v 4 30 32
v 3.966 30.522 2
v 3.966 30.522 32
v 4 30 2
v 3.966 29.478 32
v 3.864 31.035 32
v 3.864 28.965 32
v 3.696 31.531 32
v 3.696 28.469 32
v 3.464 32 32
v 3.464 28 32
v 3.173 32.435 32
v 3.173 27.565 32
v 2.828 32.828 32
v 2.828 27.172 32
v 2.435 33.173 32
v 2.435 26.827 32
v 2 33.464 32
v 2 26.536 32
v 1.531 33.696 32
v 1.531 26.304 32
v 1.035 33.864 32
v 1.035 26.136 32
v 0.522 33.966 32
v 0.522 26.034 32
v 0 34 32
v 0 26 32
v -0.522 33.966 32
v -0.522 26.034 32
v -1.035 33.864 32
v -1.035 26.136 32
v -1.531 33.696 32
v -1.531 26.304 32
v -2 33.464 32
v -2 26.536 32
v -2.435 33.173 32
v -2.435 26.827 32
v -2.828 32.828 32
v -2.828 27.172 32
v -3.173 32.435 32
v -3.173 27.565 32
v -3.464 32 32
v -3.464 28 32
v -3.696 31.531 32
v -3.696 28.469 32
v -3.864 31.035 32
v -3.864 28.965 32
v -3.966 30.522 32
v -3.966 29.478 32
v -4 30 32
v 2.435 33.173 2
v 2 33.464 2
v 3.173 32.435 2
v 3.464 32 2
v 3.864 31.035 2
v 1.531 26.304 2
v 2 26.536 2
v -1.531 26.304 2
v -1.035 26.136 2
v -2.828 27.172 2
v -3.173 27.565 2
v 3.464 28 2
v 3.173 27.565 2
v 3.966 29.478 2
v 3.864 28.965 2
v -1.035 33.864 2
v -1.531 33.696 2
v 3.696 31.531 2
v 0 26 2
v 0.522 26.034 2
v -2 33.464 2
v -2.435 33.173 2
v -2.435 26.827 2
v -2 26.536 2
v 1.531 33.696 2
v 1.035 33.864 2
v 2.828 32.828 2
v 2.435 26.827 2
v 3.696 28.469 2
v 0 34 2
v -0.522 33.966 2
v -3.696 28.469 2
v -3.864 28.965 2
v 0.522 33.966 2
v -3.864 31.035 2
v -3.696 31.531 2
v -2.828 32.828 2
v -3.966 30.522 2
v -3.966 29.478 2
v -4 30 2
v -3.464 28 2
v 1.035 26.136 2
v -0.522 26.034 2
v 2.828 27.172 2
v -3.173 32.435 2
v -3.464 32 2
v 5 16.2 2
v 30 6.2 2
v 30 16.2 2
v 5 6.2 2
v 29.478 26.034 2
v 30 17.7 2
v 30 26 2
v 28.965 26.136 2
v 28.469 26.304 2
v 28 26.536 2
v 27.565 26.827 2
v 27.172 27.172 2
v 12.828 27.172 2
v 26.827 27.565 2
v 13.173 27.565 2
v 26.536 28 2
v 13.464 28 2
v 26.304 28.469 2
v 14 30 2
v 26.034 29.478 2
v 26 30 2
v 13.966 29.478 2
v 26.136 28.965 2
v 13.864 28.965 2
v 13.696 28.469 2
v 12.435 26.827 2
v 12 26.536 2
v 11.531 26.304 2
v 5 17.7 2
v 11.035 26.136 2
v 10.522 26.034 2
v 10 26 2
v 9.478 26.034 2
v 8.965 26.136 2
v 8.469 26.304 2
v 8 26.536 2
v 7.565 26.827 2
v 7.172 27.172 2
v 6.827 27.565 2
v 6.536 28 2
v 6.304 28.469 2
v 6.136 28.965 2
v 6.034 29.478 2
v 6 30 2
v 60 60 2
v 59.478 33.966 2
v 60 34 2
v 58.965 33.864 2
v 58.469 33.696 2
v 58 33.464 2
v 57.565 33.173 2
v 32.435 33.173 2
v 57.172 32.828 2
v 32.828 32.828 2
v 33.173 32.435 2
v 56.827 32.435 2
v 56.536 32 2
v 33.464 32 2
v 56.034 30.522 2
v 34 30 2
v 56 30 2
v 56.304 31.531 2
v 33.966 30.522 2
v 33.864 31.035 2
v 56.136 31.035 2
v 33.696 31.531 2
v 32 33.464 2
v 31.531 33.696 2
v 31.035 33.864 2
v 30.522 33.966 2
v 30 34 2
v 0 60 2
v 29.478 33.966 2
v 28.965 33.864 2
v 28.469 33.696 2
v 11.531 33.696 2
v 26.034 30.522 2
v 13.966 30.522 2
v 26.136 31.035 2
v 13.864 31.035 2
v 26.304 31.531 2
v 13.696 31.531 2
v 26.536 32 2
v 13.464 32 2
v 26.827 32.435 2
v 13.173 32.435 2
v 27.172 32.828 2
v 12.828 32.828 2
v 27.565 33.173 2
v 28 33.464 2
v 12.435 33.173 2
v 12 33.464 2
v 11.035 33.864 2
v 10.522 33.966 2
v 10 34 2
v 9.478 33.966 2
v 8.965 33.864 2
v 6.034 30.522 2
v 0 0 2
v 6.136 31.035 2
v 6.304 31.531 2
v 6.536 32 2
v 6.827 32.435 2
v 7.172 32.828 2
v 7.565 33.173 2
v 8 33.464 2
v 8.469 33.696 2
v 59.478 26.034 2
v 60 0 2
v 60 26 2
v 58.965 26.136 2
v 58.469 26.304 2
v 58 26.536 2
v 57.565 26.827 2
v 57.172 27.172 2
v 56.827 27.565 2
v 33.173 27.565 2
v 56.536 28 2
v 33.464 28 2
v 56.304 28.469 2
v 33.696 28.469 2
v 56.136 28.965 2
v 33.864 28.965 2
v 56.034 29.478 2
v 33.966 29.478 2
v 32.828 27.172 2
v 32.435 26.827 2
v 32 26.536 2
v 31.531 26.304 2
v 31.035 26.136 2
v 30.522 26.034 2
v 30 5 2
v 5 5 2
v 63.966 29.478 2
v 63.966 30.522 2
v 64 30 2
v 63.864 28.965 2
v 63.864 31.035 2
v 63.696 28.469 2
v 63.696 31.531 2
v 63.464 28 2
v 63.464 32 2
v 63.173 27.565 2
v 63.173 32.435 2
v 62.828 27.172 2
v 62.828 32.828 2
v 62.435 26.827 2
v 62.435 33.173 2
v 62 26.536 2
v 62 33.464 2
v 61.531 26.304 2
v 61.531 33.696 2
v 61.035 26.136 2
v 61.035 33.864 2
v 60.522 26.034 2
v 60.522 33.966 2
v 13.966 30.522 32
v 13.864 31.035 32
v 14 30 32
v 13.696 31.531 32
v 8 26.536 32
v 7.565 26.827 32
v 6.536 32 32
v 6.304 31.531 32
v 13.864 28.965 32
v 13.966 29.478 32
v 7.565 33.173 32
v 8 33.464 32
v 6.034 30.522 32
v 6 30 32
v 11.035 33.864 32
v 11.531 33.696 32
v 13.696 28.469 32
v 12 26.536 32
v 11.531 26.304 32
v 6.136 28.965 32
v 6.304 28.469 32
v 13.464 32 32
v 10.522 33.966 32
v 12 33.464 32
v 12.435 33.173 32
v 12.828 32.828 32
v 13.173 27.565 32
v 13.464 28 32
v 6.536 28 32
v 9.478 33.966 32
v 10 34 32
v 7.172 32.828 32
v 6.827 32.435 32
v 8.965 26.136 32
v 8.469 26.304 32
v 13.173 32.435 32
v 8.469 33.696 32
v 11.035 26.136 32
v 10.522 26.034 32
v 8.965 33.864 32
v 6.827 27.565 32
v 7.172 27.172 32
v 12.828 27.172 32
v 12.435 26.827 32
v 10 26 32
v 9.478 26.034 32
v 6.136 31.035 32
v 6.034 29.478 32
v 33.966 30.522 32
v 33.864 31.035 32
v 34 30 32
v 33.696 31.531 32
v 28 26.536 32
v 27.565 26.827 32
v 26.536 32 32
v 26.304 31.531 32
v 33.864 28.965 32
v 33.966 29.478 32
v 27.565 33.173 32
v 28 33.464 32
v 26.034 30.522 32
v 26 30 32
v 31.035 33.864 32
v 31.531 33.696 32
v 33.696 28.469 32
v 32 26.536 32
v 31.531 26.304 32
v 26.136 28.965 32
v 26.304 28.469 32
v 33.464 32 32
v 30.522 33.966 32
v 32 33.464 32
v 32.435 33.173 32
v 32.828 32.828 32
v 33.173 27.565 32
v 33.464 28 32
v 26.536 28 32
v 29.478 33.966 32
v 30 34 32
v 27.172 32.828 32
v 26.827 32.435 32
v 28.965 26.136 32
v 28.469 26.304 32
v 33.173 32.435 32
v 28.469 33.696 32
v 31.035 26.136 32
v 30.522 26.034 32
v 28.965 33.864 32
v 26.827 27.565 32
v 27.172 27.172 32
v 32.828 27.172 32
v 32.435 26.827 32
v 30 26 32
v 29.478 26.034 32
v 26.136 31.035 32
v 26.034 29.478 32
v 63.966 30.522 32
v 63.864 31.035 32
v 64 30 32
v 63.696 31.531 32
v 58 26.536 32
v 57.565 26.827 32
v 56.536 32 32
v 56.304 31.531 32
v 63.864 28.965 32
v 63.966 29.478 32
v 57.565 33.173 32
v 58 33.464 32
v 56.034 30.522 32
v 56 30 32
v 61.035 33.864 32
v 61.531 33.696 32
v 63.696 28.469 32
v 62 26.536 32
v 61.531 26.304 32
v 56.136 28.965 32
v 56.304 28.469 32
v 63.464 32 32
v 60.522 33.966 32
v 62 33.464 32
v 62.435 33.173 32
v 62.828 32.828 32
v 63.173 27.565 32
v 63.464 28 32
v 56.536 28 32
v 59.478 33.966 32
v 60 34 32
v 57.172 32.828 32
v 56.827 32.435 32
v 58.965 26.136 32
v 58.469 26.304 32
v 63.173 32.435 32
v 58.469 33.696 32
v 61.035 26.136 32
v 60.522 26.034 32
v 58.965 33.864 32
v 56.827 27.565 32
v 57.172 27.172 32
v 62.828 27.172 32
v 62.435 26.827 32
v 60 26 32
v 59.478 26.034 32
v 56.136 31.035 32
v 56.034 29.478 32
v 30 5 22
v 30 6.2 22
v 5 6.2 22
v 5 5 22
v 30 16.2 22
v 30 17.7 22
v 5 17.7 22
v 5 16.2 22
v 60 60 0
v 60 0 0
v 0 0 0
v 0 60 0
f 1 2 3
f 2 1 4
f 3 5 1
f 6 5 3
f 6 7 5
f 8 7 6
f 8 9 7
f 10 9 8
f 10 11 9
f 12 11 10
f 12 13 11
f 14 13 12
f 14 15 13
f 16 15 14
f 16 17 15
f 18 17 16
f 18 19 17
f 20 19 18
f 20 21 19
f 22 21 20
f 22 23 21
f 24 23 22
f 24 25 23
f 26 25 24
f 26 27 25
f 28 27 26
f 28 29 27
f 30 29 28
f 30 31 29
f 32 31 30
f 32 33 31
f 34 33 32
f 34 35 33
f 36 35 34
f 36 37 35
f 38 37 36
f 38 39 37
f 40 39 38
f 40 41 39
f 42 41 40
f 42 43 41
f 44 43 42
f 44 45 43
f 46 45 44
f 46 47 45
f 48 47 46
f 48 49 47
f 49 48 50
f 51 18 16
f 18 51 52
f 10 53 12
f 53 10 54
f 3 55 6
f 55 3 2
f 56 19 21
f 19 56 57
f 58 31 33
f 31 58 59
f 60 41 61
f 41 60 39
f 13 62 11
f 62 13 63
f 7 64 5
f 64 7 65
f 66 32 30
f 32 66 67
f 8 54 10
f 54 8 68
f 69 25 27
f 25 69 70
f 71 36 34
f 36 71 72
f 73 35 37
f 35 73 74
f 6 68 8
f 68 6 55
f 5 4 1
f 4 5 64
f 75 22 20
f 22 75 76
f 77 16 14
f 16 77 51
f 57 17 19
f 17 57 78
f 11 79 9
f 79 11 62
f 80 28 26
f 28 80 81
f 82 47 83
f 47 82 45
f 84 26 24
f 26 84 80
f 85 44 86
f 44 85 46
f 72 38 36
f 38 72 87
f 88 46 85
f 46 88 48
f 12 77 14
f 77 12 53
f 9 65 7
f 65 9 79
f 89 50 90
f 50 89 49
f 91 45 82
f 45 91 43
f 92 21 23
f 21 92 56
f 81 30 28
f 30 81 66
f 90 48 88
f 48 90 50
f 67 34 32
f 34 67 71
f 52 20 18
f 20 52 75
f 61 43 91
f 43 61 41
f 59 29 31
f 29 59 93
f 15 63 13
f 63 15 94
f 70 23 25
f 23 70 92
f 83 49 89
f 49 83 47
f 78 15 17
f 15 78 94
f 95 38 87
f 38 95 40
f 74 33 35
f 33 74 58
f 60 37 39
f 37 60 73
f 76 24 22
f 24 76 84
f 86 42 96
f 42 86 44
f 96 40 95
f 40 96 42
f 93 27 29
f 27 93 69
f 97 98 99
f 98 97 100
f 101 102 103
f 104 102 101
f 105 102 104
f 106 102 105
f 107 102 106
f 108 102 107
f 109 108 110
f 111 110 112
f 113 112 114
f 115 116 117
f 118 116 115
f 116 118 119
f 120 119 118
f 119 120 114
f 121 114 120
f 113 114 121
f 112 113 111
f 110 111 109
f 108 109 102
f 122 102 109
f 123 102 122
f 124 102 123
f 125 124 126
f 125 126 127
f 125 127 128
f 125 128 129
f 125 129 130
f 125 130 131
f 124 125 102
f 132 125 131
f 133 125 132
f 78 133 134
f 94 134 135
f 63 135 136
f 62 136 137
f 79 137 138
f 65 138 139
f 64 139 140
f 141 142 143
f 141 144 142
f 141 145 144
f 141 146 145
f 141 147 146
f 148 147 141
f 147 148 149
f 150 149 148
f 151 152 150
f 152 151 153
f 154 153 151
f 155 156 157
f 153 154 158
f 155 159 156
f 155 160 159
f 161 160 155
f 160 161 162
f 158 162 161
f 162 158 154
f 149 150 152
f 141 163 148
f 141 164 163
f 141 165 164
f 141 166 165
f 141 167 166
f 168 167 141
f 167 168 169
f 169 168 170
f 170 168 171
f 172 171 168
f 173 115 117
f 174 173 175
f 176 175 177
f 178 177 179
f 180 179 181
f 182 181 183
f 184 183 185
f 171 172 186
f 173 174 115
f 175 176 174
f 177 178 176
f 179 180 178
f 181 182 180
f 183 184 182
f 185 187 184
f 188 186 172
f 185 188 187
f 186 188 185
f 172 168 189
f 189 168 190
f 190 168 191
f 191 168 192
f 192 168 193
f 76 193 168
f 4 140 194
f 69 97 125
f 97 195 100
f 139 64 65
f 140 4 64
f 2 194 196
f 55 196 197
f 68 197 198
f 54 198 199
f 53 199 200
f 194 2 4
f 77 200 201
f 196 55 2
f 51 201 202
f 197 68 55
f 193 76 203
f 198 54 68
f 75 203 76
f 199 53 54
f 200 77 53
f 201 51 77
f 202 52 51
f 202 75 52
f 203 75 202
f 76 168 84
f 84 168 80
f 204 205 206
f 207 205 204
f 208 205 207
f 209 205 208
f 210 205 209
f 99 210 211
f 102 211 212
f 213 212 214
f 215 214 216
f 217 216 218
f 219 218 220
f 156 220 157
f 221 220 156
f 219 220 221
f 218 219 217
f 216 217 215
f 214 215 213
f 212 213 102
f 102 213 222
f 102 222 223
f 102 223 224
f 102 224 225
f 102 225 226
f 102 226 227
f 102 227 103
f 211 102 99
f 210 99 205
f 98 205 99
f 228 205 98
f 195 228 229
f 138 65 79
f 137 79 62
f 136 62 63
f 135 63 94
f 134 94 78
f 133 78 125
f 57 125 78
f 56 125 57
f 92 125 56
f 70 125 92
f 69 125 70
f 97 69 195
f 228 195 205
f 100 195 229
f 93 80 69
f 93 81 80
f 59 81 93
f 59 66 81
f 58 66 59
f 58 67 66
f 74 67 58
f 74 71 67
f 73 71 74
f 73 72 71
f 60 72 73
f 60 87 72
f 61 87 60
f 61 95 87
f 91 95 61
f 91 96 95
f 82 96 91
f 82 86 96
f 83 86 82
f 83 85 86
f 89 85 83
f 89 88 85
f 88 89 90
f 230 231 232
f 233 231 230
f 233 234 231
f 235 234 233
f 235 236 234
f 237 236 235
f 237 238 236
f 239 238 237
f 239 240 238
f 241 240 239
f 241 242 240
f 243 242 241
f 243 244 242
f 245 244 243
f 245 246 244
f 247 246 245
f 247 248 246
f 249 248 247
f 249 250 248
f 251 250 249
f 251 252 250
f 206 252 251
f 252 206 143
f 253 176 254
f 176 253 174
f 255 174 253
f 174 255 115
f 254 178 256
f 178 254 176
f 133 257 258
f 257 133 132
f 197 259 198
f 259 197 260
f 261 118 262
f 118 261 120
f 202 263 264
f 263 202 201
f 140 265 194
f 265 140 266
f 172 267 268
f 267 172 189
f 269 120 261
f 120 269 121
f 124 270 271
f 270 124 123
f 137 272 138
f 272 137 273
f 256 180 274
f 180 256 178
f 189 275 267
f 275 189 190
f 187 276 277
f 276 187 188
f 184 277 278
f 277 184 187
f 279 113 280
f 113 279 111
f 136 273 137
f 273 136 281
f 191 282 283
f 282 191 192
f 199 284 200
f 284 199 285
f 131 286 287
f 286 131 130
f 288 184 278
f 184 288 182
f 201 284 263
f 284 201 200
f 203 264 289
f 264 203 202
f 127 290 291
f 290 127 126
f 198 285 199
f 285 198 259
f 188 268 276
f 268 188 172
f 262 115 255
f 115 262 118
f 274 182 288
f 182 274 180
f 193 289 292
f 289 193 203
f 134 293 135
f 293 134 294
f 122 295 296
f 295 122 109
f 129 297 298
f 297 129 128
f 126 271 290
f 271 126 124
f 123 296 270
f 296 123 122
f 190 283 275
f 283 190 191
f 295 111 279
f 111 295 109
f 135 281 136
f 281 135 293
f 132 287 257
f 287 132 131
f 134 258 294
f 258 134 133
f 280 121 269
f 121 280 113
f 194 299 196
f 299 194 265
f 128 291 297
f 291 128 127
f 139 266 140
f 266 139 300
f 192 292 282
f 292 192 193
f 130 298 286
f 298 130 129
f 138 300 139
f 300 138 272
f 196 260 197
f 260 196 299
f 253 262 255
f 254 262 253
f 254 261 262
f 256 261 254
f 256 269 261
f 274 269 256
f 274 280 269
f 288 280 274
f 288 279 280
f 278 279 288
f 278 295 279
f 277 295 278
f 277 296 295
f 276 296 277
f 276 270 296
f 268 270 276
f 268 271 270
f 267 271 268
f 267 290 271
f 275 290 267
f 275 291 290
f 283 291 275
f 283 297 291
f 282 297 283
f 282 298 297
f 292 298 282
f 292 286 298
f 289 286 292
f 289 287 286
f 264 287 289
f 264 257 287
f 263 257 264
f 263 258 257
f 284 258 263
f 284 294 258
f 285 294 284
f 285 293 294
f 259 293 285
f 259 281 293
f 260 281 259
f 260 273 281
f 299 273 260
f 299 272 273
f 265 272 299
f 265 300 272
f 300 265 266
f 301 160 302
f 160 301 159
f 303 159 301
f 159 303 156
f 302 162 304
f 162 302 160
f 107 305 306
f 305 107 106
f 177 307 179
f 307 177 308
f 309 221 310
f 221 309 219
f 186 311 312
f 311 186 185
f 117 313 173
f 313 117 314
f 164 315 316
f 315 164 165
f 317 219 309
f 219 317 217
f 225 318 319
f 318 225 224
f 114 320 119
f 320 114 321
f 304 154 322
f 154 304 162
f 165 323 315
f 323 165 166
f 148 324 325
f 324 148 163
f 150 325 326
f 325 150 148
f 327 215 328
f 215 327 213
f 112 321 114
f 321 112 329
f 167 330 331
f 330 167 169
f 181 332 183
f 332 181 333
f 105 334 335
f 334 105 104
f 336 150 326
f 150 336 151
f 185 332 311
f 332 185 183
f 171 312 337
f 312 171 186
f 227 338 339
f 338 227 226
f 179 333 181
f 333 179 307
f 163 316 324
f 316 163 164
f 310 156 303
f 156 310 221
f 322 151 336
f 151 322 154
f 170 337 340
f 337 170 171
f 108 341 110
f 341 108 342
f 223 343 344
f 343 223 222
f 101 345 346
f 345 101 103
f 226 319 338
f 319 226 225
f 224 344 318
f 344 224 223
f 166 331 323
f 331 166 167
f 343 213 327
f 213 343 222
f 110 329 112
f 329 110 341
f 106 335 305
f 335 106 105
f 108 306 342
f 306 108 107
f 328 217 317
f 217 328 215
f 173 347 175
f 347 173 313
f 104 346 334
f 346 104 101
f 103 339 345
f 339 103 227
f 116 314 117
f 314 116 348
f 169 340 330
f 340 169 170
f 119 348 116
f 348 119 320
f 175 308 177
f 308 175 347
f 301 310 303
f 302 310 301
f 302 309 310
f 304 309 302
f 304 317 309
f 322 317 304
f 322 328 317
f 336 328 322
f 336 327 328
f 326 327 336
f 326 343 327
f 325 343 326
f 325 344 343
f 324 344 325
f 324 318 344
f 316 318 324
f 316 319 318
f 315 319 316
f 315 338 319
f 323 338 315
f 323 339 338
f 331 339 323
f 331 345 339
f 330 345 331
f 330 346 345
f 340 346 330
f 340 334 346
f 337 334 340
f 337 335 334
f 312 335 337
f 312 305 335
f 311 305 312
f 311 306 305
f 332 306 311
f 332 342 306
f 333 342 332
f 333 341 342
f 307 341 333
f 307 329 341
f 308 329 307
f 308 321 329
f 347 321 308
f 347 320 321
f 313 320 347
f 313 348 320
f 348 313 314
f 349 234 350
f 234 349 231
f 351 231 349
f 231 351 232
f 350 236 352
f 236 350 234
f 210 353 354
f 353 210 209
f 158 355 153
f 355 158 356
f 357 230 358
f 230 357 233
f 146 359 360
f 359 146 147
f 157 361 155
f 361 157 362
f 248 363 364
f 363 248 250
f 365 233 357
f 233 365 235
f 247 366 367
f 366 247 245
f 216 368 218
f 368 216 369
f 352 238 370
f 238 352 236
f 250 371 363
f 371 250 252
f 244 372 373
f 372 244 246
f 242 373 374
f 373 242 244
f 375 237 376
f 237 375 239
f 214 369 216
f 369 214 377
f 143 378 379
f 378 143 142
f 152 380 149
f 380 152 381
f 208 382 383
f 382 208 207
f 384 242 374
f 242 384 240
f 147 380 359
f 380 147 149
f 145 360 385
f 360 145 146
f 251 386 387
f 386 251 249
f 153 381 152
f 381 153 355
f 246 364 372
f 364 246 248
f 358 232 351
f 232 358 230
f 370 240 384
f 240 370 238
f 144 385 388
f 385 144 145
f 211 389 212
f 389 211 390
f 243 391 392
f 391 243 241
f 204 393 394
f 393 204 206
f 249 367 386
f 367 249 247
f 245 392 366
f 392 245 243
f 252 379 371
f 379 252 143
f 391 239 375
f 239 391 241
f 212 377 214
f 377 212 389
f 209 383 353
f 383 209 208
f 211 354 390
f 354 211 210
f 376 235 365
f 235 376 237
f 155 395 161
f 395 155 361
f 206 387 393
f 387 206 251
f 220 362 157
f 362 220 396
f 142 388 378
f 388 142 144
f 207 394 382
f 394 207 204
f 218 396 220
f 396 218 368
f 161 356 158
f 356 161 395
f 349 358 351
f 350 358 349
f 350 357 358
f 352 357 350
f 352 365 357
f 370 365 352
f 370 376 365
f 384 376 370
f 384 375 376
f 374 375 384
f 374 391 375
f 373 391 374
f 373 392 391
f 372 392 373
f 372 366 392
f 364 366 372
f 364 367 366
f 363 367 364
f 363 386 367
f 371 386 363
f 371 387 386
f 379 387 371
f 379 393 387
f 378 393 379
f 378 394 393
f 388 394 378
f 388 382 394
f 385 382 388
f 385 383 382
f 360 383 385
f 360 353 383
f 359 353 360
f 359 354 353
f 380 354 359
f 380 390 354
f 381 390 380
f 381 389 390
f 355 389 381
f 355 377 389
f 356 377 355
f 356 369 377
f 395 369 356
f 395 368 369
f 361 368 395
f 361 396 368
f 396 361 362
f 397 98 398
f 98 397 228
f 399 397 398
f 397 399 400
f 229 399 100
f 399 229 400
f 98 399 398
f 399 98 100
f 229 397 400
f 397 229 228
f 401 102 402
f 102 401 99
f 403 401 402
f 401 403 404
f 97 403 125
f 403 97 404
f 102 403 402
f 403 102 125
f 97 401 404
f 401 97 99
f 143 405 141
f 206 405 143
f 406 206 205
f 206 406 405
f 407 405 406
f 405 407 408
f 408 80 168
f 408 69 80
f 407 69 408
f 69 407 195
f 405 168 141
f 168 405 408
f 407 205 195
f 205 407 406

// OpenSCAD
// Calibration test print for Printalot Flex PLA
// Tests retraction (stringing) and thin wall integrity

// --- Parameters ---
base_thickness = 2;
base_width = 60;       // X dimension
base_depth = 60;       // Y dimension

// Retraction towers
tower_d = 8;           // diameter
tower_h = 30;
tower_count = 4;
// Towers placed along X at: 0, 20, 40, 60mm spacing from first tower
// Gaps between adjacent towers: 20mm, 20mm, 20mm
// But we want varied gaps: 20, 40, 60 from center
// Place 4 towers at X positions so gaps are 20, 20, 20 (total span 60mm)
// Actually - plan says spaced at 20mm, 40mm, 60mm apart
// Meaning: tower 1 at origin, then gaps of 20, 40, 60 between pairs
// That would span 120mm - too wide. Re-reading: "spaced at 20mm, 40mm, 60mm apart"
// means 3 gaps between 4 towers: 20, 20, 20 = 60mm span fits the base
// To test different travel distances, let's do asymmetric: 10, 20, 30mm gaps
tower_positions = [0, 10, 30, 60]; // gaps: 10, 20, 30mm

// Thin wall strips
wall_1_thickness = 1.2;  // matches goggles net_gap
wall_2_thickness = 1.5;  // matches goggles wall thickness
wall_height = 20;
wall_length = 25;
wall_gap = 10;           // space between the two walls

// --- Base plate ---
module base_plate() {
    cube([base_width, base_depth, base_thickness]);
}

// --- Retraction towers ---
module retraction_towers() {
    y_pos = base_depth / 2;
    for (x = tower_positions) {
        translate([x, y_pos, base_thickness])
            cylinder(d = tower_d, h = tower_h, $fn = 48);
    }
}

// --- Thin wall strips ---
module thin_walls() {
    x_start = 5;
    y_start = 5;

    // 1.2mm wall
    translate([x_start, y_start, base_thickness])
        cube([wall_length, wall_1_thickness, wall_height]);

    // 1.5mm wall
    translate([x_start, y_start + wall_1_thickness + wall_gap, base_thickness])
        cube([wall_length, wall_2_thickness, wall_height]);
}

// --- Assembly ---
base_plate();
retraction_towers();
thin_walls();
